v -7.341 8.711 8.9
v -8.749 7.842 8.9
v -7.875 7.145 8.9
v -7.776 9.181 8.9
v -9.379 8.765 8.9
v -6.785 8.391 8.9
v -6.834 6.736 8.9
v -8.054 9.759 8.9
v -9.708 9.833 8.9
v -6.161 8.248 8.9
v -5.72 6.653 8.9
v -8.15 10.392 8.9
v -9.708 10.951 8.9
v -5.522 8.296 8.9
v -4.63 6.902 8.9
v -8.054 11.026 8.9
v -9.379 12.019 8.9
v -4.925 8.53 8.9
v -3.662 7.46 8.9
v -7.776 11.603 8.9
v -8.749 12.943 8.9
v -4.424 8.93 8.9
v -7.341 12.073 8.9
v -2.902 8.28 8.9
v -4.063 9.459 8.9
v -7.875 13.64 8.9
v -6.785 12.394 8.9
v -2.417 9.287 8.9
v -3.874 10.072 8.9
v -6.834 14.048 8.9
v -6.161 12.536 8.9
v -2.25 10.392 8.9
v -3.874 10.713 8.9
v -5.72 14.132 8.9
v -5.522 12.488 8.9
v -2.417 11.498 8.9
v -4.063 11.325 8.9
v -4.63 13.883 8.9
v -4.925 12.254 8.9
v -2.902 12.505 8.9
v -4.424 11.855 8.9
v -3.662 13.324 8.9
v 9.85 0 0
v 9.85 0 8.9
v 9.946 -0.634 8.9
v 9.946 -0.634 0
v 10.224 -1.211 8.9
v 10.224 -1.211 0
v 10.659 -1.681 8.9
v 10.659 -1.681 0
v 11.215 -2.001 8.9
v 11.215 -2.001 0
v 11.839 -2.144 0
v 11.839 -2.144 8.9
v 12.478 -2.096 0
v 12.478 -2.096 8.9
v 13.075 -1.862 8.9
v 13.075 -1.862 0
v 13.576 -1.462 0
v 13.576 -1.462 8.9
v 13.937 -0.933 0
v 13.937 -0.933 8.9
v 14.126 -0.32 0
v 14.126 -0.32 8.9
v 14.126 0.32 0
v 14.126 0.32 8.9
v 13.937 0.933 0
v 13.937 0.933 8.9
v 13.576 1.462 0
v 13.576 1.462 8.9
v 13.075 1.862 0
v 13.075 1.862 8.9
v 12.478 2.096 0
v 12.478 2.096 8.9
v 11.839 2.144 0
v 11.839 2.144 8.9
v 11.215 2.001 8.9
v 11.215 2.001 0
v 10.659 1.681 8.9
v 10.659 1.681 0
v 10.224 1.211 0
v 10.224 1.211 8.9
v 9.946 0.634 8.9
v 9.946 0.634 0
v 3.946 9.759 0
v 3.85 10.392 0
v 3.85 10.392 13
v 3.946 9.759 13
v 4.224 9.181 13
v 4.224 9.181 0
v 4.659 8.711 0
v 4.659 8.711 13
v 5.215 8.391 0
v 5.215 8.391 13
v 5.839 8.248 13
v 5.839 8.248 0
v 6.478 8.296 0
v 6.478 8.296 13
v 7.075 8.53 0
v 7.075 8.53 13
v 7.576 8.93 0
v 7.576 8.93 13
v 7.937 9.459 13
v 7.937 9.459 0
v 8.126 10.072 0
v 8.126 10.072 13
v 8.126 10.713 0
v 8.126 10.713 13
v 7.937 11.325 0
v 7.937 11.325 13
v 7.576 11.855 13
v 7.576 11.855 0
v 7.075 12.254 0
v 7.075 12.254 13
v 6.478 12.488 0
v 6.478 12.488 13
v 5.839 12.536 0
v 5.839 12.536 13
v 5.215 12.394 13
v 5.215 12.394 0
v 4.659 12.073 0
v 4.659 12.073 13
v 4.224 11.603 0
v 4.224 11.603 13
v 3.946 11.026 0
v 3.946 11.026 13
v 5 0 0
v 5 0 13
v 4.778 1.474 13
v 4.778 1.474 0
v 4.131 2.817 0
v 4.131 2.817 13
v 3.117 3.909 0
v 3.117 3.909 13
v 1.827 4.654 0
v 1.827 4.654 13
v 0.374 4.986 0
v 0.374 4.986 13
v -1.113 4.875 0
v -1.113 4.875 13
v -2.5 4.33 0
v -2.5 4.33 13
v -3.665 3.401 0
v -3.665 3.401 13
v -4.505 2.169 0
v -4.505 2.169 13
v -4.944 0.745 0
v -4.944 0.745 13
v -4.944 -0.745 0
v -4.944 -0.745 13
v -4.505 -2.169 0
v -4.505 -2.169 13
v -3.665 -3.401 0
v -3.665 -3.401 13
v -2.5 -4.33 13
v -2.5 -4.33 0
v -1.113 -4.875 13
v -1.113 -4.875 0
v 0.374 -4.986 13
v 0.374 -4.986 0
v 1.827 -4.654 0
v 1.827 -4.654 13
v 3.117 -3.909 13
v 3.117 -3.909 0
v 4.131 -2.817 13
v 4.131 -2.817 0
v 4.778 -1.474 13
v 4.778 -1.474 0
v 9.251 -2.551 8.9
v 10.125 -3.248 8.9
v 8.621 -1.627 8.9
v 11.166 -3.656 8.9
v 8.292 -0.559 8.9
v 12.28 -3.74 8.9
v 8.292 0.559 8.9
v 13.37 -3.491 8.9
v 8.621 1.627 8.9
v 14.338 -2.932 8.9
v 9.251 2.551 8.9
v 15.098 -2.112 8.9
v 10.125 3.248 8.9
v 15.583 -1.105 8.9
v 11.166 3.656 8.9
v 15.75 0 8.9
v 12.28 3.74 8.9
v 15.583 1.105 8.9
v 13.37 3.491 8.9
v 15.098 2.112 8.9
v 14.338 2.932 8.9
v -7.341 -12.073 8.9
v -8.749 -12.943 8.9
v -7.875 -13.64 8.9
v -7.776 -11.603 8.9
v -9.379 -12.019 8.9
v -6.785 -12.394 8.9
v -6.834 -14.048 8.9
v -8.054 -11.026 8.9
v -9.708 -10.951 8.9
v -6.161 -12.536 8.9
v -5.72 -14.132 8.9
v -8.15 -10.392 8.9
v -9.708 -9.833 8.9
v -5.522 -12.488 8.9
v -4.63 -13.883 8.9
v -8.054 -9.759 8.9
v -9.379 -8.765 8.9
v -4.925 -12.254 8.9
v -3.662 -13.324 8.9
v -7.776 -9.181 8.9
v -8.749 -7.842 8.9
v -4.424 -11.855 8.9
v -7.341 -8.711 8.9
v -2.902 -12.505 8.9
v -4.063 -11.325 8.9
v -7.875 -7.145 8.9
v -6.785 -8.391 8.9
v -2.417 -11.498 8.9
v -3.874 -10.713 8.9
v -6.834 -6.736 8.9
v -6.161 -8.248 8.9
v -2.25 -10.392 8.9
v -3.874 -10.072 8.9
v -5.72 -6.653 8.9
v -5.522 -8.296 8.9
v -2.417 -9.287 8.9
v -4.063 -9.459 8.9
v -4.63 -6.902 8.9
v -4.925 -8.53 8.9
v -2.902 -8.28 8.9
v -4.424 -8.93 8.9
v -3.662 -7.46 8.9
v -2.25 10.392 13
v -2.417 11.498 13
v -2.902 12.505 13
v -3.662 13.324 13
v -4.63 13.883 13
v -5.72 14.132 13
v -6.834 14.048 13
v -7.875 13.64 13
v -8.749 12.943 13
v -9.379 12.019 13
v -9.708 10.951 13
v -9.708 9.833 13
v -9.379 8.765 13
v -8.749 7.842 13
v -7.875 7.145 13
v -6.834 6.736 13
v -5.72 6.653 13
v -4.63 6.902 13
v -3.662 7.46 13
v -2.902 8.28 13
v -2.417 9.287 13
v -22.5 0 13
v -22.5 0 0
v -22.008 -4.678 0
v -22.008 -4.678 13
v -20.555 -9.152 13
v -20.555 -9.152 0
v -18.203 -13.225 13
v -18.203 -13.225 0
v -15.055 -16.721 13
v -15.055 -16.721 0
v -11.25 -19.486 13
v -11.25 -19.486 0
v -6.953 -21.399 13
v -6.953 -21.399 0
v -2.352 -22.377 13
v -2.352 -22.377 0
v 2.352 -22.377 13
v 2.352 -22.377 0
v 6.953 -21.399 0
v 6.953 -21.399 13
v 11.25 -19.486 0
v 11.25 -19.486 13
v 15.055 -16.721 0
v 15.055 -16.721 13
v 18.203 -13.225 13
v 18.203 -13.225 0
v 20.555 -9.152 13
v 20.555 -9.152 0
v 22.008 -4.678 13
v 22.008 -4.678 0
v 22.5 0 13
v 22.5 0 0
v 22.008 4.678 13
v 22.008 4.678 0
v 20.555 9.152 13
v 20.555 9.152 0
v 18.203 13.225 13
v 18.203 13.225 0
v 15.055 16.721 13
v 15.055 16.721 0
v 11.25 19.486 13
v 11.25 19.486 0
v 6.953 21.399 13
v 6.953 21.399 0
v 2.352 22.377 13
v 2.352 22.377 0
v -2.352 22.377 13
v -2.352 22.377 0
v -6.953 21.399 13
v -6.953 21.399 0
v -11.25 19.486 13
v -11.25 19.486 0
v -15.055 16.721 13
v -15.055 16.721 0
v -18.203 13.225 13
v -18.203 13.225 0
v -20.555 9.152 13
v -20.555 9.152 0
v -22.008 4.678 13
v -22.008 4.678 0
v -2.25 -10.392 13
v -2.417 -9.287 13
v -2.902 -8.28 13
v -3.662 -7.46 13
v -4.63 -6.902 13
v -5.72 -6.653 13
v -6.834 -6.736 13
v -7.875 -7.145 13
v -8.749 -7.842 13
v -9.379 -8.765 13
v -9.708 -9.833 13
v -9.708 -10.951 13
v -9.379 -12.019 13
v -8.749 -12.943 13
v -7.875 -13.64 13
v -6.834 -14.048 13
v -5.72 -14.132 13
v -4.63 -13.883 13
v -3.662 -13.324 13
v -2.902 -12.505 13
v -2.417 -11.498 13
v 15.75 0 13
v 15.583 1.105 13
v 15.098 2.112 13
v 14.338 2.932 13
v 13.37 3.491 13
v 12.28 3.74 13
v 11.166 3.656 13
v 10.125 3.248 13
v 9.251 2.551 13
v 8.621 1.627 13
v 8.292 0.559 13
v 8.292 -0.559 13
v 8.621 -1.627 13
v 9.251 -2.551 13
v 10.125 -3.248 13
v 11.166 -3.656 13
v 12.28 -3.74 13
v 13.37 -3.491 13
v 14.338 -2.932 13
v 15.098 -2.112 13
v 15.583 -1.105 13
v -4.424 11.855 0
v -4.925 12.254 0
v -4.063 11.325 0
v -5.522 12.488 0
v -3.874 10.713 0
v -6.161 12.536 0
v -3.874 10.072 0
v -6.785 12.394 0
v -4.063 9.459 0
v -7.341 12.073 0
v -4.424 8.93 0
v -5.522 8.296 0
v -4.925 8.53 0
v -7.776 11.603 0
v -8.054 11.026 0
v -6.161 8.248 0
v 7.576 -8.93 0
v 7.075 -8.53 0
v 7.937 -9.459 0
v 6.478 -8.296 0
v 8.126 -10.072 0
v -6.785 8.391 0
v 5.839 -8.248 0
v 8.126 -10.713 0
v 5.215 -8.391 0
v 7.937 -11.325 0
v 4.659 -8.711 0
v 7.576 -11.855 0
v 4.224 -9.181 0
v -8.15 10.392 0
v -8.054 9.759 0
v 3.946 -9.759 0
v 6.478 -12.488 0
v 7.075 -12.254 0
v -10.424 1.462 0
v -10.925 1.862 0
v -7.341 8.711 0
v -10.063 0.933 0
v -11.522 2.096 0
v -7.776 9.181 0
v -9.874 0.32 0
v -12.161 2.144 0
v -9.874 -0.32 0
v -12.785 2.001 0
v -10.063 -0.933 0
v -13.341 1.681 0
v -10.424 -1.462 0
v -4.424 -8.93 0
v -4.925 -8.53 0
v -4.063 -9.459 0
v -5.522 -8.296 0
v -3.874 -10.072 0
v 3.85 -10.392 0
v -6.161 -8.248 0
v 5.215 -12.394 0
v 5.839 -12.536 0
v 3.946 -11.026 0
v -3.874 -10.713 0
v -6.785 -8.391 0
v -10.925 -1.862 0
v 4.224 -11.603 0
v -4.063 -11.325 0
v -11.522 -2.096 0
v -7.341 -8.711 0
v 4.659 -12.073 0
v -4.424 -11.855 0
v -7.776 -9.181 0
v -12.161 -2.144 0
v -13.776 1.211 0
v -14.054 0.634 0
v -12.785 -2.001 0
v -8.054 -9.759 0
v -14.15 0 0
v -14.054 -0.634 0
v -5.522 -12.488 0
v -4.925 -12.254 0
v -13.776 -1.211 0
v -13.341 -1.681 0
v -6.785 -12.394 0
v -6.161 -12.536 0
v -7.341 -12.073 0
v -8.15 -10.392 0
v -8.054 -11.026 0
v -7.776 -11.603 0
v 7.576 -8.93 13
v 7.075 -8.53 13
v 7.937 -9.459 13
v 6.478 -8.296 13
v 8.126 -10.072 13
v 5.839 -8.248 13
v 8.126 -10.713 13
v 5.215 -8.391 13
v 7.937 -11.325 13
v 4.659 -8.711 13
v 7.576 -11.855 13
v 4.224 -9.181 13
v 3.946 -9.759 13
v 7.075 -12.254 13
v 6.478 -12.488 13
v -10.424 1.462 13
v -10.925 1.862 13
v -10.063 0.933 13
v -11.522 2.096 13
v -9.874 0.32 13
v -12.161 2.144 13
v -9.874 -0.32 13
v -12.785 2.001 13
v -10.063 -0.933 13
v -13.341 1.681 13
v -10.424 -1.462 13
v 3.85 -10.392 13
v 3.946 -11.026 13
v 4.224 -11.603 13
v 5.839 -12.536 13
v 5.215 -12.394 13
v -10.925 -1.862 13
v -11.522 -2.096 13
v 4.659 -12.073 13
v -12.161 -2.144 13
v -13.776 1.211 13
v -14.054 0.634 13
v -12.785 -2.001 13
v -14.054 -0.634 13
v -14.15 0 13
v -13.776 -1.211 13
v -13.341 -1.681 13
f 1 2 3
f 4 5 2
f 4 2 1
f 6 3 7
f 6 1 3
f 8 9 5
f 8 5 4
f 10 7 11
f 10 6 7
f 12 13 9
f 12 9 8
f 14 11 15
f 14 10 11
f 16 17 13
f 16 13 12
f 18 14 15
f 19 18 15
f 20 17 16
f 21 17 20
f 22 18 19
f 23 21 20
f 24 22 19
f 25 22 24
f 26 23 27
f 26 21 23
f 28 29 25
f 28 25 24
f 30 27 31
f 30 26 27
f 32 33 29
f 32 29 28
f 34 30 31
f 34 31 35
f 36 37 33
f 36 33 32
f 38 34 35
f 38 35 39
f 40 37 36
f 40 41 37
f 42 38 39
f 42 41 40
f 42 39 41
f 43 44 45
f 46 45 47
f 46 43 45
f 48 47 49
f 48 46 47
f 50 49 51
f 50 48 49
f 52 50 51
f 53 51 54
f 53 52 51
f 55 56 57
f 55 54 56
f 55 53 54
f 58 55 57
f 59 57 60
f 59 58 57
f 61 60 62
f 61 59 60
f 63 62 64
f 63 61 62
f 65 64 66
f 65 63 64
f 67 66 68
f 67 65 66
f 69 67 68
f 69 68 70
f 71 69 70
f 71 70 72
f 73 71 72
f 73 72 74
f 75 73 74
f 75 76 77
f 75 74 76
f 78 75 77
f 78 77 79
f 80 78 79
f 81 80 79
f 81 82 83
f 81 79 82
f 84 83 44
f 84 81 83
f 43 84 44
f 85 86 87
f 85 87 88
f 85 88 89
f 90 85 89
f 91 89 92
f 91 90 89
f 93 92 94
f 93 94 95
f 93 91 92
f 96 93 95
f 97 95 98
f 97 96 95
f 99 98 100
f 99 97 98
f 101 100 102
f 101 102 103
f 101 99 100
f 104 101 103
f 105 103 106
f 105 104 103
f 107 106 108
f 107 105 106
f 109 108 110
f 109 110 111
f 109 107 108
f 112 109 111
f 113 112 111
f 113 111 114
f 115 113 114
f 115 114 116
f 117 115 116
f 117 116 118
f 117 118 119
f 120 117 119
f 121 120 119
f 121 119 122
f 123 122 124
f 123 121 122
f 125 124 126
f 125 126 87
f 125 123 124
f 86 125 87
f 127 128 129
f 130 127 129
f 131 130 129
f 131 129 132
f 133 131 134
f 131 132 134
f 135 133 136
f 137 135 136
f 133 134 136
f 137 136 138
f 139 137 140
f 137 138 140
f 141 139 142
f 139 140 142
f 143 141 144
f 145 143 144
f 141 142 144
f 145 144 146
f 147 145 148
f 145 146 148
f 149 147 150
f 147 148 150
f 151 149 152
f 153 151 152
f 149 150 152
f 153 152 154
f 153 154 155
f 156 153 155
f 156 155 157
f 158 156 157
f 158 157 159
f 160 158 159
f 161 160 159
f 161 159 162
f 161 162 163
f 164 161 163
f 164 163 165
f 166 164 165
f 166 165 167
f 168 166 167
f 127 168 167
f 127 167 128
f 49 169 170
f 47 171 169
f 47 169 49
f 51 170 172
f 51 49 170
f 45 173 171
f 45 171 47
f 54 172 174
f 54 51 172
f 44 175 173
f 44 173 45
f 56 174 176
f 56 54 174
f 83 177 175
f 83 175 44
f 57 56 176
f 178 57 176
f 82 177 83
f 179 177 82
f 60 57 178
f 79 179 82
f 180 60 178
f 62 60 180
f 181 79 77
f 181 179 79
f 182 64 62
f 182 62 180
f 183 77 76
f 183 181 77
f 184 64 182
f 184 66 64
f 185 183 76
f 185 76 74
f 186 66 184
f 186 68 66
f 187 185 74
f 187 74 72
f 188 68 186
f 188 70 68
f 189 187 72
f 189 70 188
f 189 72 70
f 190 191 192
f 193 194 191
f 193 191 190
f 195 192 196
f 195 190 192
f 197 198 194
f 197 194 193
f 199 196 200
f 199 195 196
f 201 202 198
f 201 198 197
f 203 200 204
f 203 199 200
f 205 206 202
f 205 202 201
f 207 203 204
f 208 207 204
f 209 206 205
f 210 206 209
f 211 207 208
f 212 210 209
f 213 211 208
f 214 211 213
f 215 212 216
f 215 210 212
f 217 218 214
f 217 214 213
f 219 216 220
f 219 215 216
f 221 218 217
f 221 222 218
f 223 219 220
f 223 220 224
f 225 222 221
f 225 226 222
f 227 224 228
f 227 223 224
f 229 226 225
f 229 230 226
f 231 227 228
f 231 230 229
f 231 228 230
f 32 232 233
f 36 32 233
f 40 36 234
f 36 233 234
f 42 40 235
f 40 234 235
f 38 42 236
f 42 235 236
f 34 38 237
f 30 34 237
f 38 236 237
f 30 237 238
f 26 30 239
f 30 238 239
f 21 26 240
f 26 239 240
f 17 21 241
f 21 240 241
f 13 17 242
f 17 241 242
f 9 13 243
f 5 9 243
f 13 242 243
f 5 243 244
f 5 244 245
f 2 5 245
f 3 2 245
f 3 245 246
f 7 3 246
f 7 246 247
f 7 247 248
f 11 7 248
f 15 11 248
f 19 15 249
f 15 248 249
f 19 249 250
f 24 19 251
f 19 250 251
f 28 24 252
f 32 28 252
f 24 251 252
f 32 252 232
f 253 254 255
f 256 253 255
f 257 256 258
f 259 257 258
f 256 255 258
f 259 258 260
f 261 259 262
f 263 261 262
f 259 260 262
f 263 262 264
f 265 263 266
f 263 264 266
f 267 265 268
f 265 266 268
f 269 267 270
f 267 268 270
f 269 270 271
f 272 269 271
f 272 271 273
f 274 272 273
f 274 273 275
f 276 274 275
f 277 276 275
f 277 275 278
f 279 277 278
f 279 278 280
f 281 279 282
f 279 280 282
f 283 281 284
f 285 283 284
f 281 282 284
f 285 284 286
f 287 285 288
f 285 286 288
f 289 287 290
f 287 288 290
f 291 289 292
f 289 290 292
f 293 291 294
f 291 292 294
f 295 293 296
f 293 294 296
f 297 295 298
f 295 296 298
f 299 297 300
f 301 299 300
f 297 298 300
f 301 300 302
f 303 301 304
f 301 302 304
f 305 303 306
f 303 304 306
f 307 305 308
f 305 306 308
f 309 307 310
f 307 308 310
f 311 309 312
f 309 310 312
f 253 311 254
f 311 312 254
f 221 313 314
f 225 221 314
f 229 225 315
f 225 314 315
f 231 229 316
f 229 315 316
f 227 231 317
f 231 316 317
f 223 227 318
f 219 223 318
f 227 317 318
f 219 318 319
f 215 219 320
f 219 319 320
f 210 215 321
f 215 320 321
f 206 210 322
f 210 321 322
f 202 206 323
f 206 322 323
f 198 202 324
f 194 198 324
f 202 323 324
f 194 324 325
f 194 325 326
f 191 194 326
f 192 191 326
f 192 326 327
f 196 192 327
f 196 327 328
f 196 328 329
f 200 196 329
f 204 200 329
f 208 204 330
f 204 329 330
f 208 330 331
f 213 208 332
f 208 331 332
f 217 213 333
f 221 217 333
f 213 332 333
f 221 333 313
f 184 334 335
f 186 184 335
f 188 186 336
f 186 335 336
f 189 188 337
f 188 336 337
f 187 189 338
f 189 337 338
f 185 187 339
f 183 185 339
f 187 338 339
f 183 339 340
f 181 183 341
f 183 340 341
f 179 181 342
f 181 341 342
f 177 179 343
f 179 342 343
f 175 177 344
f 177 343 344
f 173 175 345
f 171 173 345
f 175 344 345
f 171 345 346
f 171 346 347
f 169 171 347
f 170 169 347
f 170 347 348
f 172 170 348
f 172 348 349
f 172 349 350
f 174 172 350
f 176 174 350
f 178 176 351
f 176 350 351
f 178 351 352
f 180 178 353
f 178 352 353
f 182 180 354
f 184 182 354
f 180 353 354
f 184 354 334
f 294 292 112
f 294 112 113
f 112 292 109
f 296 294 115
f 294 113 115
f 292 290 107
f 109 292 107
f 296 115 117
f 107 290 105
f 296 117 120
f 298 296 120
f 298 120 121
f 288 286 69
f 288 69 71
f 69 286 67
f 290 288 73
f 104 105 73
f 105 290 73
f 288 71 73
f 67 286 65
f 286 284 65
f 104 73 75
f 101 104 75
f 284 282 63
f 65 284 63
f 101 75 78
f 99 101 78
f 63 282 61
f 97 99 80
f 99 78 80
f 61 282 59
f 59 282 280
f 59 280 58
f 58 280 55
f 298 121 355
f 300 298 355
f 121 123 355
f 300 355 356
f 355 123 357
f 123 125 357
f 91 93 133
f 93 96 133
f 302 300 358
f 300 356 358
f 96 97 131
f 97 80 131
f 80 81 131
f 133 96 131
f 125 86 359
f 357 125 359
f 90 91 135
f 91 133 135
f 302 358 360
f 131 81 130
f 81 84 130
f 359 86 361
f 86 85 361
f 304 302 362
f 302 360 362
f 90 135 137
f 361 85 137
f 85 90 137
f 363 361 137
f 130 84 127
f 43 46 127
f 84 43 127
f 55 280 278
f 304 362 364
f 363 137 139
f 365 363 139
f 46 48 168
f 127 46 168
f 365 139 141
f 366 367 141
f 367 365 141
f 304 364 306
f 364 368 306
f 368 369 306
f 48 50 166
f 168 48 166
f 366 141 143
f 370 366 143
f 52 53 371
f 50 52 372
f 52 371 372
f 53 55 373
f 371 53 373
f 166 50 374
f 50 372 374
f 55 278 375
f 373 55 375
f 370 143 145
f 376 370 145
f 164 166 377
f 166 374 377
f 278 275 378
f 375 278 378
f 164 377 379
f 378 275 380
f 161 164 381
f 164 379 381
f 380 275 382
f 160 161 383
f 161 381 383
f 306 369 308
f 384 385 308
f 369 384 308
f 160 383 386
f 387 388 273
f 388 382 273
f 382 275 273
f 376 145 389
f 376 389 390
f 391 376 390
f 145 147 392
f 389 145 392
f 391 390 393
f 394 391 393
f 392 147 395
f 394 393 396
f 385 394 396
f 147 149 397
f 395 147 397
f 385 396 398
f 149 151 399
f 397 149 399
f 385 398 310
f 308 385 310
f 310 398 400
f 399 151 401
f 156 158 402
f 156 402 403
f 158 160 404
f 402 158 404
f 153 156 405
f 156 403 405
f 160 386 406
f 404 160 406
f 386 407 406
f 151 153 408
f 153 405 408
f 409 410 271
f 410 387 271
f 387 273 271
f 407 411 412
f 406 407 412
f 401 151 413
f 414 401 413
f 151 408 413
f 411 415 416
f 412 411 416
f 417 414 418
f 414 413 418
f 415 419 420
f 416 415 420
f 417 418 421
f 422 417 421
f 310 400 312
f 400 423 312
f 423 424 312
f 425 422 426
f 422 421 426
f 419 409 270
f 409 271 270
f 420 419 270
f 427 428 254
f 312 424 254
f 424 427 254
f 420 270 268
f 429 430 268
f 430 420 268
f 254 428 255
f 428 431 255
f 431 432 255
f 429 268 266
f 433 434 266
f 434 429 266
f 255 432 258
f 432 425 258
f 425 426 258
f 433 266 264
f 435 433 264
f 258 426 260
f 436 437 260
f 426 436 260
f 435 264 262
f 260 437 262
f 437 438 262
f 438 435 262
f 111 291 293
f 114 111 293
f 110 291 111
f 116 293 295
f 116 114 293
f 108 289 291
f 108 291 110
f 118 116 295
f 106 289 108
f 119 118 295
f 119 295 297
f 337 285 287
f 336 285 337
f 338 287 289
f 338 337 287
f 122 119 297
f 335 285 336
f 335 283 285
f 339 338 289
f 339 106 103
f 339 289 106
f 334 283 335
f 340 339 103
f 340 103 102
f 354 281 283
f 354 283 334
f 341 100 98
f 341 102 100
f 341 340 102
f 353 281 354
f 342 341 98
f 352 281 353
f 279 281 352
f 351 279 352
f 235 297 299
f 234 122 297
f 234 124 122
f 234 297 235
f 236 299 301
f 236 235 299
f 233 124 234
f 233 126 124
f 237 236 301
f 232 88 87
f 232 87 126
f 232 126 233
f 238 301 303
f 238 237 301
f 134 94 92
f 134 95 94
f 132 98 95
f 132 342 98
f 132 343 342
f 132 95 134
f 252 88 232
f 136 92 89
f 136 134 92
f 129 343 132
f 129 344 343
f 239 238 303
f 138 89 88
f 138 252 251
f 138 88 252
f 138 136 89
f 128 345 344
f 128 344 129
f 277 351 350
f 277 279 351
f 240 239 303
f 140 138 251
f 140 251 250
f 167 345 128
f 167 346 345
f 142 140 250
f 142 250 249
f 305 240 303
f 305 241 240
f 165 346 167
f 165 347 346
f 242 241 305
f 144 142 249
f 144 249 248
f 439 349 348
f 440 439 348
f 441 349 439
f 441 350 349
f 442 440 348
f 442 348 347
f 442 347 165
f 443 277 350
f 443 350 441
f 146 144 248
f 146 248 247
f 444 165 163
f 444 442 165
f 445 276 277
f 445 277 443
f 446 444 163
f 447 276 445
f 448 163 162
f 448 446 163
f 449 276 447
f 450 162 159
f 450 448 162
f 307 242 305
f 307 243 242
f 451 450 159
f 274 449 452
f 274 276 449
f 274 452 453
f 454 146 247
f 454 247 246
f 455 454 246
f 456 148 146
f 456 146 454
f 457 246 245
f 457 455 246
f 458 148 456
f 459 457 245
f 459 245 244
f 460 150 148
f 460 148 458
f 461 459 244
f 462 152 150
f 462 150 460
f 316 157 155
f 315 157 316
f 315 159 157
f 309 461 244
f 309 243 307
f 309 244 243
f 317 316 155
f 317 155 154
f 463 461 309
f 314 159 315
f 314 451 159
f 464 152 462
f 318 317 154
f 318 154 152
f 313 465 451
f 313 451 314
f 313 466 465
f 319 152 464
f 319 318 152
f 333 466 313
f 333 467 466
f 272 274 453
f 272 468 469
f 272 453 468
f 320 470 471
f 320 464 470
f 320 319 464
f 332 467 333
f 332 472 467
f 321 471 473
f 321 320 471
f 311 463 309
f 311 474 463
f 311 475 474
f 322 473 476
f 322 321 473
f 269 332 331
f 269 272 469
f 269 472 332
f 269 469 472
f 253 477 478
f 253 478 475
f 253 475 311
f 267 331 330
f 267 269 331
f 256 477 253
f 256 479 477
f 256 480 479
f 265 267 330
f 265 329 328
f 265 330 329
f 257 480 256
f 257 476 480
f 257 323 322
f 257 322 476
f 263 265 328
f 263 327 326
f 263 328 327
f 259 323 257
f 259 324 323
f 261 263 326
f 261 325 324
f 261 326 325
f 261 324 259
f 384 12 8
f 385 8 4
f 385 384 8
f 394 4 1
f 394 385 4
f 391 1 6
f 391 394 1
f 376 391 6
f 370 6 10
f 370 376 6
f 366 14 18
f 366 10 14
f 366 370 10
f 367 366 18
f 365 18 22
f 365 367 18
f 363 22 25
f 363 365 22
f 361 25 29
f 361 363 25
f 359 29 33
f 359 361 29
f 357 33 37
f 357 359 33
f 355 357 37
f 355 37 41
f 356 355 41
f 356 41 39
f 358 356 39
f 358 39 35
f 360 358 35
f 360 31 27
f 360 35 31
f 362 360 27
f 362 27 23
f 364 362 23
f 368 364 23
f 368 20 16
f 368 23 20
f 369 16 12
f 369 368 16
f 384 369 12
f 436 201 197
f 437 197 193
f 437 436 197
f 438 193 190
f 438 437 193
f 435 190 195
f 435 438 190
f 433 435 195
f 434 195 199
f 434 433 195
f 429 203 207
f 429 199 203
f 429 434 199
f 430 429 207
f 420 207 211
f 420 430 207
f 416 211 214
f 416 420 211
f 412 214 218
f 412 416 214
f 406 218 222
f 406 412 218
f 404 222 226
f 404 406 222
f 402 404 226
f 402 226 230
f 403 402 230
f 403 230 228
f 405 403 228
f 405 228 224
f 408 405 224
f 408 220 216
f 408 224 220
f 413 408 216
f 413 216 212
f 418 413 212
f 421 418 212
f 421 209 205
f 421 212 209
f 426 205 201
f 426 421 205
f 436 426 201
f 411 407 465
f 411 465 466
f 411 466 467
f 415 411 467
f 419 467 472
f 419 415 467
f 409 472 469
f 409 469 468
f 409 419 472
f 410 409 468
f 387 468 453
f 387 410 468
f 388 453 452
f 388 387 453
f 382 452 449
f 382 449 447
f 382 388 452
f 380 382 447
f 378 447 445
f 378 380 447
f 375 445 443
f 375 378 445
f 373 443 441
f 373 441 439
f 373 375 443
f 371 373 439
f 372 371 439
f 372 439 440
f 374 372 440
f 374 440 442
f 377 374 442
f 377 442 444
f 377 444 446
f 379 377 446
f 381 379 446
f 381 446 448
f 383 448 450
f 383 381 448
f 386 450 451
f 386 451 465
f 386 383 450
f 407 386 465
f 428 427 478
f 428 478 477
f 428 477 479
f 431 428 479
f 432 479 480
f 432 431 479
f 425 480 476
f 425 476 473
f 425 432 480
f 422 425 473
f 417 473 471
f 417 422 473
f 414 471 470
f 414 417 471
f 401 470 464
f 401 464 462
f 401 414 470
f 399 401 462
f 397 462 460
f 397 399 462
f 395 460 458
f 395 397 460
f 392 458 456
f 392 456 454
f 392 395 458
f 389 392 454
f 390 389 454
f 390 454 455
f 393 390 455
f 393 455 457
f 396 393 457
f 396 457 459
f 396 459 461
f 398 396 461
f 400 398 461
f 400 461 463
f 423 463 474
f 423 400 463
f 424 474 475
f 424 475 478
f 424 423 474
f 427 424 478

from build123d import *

# Parameters (mm, degrees)
SKETCH2_R           = 22.5
SKETCH2_R_2         = 2.15
BOSS_EXTRUDE1_DEPTH = 13
SKETCH3_R           = 3.75
CUT_EXTRUDE1_DEPTH  = 4.1
SKETCH5_R           = 5
CUT_EXTRUDE3_DEPTH  = 35.372954485


with BuildPart() as part:
    # Sketch2 → Boss-Extrude1 (new body)
    with BuildSketch(Plane.XY):
        with Locations(Location((0, 0, 0), (0, 0, 180))):
            Circle(SKETCH2_R)
        with Locations(Location((12, 0, 0), (0, 0, 180))):
            Circle(SKETCH2_R_2, mode=Mode.SUBTRACT)
        with Locations(Location((6, -10.392304845, 0), (0, 0, 180))):
            Circle(SKETCH2_R_2, mode=Mode.SUBTRACT)
        with Locations(Location((-6, -10.392304845, 0), (0, 0, 180))):
            Circle(SKETCH2_R_2, mode=Mode.SUBTRACT)
        with Locations(Location((-12, 0, 0), (0, 0, 180))):
            Circle(SKETCH2_R_2, mode=Mode.SUBTRACT)
        with Locations(Location((-6, 10.392304845, 0), (0, 0, 180))):
            Circle(SKETCH2_R_2, mode=Mode.SUBTRACT)
        with Locations(Location((6, 10.392304845, 0), (0, 0, 180))):
            Circle(SKETCH2_R_2, mode=Mode.SUBTRACT)
    extrude(amount=BOSS_EXTRUDE1_DEPTH)

    # Sketch3 → Cut-Extrude1 (cut)
    with BuildSketch(Plane.XY.offset(13)):
        with Locations((-6, 10.392304845)):
            Circle(SKETCH3_R)
        with Locations((-6, -10.392304845)):
            Circle(SKETCH3_R)
        with Locations((12, 0)):
            Circle(SKETCH3_R)
    extrude(amount=-CUT_EXTRUDE1_DEPTH, mode=Mode.SUBTRACT)

    # Sketch5 → Cut-Extrude3 (cut, through all)
    with BuildSketch(Plane.XY.offset(13)):
        Circle(SKETCH5_R)
    extrude(amount=-CUT_EXTRUDE3_DEPTH, mode=Mode.SUBTRACT)


solid = part.part
